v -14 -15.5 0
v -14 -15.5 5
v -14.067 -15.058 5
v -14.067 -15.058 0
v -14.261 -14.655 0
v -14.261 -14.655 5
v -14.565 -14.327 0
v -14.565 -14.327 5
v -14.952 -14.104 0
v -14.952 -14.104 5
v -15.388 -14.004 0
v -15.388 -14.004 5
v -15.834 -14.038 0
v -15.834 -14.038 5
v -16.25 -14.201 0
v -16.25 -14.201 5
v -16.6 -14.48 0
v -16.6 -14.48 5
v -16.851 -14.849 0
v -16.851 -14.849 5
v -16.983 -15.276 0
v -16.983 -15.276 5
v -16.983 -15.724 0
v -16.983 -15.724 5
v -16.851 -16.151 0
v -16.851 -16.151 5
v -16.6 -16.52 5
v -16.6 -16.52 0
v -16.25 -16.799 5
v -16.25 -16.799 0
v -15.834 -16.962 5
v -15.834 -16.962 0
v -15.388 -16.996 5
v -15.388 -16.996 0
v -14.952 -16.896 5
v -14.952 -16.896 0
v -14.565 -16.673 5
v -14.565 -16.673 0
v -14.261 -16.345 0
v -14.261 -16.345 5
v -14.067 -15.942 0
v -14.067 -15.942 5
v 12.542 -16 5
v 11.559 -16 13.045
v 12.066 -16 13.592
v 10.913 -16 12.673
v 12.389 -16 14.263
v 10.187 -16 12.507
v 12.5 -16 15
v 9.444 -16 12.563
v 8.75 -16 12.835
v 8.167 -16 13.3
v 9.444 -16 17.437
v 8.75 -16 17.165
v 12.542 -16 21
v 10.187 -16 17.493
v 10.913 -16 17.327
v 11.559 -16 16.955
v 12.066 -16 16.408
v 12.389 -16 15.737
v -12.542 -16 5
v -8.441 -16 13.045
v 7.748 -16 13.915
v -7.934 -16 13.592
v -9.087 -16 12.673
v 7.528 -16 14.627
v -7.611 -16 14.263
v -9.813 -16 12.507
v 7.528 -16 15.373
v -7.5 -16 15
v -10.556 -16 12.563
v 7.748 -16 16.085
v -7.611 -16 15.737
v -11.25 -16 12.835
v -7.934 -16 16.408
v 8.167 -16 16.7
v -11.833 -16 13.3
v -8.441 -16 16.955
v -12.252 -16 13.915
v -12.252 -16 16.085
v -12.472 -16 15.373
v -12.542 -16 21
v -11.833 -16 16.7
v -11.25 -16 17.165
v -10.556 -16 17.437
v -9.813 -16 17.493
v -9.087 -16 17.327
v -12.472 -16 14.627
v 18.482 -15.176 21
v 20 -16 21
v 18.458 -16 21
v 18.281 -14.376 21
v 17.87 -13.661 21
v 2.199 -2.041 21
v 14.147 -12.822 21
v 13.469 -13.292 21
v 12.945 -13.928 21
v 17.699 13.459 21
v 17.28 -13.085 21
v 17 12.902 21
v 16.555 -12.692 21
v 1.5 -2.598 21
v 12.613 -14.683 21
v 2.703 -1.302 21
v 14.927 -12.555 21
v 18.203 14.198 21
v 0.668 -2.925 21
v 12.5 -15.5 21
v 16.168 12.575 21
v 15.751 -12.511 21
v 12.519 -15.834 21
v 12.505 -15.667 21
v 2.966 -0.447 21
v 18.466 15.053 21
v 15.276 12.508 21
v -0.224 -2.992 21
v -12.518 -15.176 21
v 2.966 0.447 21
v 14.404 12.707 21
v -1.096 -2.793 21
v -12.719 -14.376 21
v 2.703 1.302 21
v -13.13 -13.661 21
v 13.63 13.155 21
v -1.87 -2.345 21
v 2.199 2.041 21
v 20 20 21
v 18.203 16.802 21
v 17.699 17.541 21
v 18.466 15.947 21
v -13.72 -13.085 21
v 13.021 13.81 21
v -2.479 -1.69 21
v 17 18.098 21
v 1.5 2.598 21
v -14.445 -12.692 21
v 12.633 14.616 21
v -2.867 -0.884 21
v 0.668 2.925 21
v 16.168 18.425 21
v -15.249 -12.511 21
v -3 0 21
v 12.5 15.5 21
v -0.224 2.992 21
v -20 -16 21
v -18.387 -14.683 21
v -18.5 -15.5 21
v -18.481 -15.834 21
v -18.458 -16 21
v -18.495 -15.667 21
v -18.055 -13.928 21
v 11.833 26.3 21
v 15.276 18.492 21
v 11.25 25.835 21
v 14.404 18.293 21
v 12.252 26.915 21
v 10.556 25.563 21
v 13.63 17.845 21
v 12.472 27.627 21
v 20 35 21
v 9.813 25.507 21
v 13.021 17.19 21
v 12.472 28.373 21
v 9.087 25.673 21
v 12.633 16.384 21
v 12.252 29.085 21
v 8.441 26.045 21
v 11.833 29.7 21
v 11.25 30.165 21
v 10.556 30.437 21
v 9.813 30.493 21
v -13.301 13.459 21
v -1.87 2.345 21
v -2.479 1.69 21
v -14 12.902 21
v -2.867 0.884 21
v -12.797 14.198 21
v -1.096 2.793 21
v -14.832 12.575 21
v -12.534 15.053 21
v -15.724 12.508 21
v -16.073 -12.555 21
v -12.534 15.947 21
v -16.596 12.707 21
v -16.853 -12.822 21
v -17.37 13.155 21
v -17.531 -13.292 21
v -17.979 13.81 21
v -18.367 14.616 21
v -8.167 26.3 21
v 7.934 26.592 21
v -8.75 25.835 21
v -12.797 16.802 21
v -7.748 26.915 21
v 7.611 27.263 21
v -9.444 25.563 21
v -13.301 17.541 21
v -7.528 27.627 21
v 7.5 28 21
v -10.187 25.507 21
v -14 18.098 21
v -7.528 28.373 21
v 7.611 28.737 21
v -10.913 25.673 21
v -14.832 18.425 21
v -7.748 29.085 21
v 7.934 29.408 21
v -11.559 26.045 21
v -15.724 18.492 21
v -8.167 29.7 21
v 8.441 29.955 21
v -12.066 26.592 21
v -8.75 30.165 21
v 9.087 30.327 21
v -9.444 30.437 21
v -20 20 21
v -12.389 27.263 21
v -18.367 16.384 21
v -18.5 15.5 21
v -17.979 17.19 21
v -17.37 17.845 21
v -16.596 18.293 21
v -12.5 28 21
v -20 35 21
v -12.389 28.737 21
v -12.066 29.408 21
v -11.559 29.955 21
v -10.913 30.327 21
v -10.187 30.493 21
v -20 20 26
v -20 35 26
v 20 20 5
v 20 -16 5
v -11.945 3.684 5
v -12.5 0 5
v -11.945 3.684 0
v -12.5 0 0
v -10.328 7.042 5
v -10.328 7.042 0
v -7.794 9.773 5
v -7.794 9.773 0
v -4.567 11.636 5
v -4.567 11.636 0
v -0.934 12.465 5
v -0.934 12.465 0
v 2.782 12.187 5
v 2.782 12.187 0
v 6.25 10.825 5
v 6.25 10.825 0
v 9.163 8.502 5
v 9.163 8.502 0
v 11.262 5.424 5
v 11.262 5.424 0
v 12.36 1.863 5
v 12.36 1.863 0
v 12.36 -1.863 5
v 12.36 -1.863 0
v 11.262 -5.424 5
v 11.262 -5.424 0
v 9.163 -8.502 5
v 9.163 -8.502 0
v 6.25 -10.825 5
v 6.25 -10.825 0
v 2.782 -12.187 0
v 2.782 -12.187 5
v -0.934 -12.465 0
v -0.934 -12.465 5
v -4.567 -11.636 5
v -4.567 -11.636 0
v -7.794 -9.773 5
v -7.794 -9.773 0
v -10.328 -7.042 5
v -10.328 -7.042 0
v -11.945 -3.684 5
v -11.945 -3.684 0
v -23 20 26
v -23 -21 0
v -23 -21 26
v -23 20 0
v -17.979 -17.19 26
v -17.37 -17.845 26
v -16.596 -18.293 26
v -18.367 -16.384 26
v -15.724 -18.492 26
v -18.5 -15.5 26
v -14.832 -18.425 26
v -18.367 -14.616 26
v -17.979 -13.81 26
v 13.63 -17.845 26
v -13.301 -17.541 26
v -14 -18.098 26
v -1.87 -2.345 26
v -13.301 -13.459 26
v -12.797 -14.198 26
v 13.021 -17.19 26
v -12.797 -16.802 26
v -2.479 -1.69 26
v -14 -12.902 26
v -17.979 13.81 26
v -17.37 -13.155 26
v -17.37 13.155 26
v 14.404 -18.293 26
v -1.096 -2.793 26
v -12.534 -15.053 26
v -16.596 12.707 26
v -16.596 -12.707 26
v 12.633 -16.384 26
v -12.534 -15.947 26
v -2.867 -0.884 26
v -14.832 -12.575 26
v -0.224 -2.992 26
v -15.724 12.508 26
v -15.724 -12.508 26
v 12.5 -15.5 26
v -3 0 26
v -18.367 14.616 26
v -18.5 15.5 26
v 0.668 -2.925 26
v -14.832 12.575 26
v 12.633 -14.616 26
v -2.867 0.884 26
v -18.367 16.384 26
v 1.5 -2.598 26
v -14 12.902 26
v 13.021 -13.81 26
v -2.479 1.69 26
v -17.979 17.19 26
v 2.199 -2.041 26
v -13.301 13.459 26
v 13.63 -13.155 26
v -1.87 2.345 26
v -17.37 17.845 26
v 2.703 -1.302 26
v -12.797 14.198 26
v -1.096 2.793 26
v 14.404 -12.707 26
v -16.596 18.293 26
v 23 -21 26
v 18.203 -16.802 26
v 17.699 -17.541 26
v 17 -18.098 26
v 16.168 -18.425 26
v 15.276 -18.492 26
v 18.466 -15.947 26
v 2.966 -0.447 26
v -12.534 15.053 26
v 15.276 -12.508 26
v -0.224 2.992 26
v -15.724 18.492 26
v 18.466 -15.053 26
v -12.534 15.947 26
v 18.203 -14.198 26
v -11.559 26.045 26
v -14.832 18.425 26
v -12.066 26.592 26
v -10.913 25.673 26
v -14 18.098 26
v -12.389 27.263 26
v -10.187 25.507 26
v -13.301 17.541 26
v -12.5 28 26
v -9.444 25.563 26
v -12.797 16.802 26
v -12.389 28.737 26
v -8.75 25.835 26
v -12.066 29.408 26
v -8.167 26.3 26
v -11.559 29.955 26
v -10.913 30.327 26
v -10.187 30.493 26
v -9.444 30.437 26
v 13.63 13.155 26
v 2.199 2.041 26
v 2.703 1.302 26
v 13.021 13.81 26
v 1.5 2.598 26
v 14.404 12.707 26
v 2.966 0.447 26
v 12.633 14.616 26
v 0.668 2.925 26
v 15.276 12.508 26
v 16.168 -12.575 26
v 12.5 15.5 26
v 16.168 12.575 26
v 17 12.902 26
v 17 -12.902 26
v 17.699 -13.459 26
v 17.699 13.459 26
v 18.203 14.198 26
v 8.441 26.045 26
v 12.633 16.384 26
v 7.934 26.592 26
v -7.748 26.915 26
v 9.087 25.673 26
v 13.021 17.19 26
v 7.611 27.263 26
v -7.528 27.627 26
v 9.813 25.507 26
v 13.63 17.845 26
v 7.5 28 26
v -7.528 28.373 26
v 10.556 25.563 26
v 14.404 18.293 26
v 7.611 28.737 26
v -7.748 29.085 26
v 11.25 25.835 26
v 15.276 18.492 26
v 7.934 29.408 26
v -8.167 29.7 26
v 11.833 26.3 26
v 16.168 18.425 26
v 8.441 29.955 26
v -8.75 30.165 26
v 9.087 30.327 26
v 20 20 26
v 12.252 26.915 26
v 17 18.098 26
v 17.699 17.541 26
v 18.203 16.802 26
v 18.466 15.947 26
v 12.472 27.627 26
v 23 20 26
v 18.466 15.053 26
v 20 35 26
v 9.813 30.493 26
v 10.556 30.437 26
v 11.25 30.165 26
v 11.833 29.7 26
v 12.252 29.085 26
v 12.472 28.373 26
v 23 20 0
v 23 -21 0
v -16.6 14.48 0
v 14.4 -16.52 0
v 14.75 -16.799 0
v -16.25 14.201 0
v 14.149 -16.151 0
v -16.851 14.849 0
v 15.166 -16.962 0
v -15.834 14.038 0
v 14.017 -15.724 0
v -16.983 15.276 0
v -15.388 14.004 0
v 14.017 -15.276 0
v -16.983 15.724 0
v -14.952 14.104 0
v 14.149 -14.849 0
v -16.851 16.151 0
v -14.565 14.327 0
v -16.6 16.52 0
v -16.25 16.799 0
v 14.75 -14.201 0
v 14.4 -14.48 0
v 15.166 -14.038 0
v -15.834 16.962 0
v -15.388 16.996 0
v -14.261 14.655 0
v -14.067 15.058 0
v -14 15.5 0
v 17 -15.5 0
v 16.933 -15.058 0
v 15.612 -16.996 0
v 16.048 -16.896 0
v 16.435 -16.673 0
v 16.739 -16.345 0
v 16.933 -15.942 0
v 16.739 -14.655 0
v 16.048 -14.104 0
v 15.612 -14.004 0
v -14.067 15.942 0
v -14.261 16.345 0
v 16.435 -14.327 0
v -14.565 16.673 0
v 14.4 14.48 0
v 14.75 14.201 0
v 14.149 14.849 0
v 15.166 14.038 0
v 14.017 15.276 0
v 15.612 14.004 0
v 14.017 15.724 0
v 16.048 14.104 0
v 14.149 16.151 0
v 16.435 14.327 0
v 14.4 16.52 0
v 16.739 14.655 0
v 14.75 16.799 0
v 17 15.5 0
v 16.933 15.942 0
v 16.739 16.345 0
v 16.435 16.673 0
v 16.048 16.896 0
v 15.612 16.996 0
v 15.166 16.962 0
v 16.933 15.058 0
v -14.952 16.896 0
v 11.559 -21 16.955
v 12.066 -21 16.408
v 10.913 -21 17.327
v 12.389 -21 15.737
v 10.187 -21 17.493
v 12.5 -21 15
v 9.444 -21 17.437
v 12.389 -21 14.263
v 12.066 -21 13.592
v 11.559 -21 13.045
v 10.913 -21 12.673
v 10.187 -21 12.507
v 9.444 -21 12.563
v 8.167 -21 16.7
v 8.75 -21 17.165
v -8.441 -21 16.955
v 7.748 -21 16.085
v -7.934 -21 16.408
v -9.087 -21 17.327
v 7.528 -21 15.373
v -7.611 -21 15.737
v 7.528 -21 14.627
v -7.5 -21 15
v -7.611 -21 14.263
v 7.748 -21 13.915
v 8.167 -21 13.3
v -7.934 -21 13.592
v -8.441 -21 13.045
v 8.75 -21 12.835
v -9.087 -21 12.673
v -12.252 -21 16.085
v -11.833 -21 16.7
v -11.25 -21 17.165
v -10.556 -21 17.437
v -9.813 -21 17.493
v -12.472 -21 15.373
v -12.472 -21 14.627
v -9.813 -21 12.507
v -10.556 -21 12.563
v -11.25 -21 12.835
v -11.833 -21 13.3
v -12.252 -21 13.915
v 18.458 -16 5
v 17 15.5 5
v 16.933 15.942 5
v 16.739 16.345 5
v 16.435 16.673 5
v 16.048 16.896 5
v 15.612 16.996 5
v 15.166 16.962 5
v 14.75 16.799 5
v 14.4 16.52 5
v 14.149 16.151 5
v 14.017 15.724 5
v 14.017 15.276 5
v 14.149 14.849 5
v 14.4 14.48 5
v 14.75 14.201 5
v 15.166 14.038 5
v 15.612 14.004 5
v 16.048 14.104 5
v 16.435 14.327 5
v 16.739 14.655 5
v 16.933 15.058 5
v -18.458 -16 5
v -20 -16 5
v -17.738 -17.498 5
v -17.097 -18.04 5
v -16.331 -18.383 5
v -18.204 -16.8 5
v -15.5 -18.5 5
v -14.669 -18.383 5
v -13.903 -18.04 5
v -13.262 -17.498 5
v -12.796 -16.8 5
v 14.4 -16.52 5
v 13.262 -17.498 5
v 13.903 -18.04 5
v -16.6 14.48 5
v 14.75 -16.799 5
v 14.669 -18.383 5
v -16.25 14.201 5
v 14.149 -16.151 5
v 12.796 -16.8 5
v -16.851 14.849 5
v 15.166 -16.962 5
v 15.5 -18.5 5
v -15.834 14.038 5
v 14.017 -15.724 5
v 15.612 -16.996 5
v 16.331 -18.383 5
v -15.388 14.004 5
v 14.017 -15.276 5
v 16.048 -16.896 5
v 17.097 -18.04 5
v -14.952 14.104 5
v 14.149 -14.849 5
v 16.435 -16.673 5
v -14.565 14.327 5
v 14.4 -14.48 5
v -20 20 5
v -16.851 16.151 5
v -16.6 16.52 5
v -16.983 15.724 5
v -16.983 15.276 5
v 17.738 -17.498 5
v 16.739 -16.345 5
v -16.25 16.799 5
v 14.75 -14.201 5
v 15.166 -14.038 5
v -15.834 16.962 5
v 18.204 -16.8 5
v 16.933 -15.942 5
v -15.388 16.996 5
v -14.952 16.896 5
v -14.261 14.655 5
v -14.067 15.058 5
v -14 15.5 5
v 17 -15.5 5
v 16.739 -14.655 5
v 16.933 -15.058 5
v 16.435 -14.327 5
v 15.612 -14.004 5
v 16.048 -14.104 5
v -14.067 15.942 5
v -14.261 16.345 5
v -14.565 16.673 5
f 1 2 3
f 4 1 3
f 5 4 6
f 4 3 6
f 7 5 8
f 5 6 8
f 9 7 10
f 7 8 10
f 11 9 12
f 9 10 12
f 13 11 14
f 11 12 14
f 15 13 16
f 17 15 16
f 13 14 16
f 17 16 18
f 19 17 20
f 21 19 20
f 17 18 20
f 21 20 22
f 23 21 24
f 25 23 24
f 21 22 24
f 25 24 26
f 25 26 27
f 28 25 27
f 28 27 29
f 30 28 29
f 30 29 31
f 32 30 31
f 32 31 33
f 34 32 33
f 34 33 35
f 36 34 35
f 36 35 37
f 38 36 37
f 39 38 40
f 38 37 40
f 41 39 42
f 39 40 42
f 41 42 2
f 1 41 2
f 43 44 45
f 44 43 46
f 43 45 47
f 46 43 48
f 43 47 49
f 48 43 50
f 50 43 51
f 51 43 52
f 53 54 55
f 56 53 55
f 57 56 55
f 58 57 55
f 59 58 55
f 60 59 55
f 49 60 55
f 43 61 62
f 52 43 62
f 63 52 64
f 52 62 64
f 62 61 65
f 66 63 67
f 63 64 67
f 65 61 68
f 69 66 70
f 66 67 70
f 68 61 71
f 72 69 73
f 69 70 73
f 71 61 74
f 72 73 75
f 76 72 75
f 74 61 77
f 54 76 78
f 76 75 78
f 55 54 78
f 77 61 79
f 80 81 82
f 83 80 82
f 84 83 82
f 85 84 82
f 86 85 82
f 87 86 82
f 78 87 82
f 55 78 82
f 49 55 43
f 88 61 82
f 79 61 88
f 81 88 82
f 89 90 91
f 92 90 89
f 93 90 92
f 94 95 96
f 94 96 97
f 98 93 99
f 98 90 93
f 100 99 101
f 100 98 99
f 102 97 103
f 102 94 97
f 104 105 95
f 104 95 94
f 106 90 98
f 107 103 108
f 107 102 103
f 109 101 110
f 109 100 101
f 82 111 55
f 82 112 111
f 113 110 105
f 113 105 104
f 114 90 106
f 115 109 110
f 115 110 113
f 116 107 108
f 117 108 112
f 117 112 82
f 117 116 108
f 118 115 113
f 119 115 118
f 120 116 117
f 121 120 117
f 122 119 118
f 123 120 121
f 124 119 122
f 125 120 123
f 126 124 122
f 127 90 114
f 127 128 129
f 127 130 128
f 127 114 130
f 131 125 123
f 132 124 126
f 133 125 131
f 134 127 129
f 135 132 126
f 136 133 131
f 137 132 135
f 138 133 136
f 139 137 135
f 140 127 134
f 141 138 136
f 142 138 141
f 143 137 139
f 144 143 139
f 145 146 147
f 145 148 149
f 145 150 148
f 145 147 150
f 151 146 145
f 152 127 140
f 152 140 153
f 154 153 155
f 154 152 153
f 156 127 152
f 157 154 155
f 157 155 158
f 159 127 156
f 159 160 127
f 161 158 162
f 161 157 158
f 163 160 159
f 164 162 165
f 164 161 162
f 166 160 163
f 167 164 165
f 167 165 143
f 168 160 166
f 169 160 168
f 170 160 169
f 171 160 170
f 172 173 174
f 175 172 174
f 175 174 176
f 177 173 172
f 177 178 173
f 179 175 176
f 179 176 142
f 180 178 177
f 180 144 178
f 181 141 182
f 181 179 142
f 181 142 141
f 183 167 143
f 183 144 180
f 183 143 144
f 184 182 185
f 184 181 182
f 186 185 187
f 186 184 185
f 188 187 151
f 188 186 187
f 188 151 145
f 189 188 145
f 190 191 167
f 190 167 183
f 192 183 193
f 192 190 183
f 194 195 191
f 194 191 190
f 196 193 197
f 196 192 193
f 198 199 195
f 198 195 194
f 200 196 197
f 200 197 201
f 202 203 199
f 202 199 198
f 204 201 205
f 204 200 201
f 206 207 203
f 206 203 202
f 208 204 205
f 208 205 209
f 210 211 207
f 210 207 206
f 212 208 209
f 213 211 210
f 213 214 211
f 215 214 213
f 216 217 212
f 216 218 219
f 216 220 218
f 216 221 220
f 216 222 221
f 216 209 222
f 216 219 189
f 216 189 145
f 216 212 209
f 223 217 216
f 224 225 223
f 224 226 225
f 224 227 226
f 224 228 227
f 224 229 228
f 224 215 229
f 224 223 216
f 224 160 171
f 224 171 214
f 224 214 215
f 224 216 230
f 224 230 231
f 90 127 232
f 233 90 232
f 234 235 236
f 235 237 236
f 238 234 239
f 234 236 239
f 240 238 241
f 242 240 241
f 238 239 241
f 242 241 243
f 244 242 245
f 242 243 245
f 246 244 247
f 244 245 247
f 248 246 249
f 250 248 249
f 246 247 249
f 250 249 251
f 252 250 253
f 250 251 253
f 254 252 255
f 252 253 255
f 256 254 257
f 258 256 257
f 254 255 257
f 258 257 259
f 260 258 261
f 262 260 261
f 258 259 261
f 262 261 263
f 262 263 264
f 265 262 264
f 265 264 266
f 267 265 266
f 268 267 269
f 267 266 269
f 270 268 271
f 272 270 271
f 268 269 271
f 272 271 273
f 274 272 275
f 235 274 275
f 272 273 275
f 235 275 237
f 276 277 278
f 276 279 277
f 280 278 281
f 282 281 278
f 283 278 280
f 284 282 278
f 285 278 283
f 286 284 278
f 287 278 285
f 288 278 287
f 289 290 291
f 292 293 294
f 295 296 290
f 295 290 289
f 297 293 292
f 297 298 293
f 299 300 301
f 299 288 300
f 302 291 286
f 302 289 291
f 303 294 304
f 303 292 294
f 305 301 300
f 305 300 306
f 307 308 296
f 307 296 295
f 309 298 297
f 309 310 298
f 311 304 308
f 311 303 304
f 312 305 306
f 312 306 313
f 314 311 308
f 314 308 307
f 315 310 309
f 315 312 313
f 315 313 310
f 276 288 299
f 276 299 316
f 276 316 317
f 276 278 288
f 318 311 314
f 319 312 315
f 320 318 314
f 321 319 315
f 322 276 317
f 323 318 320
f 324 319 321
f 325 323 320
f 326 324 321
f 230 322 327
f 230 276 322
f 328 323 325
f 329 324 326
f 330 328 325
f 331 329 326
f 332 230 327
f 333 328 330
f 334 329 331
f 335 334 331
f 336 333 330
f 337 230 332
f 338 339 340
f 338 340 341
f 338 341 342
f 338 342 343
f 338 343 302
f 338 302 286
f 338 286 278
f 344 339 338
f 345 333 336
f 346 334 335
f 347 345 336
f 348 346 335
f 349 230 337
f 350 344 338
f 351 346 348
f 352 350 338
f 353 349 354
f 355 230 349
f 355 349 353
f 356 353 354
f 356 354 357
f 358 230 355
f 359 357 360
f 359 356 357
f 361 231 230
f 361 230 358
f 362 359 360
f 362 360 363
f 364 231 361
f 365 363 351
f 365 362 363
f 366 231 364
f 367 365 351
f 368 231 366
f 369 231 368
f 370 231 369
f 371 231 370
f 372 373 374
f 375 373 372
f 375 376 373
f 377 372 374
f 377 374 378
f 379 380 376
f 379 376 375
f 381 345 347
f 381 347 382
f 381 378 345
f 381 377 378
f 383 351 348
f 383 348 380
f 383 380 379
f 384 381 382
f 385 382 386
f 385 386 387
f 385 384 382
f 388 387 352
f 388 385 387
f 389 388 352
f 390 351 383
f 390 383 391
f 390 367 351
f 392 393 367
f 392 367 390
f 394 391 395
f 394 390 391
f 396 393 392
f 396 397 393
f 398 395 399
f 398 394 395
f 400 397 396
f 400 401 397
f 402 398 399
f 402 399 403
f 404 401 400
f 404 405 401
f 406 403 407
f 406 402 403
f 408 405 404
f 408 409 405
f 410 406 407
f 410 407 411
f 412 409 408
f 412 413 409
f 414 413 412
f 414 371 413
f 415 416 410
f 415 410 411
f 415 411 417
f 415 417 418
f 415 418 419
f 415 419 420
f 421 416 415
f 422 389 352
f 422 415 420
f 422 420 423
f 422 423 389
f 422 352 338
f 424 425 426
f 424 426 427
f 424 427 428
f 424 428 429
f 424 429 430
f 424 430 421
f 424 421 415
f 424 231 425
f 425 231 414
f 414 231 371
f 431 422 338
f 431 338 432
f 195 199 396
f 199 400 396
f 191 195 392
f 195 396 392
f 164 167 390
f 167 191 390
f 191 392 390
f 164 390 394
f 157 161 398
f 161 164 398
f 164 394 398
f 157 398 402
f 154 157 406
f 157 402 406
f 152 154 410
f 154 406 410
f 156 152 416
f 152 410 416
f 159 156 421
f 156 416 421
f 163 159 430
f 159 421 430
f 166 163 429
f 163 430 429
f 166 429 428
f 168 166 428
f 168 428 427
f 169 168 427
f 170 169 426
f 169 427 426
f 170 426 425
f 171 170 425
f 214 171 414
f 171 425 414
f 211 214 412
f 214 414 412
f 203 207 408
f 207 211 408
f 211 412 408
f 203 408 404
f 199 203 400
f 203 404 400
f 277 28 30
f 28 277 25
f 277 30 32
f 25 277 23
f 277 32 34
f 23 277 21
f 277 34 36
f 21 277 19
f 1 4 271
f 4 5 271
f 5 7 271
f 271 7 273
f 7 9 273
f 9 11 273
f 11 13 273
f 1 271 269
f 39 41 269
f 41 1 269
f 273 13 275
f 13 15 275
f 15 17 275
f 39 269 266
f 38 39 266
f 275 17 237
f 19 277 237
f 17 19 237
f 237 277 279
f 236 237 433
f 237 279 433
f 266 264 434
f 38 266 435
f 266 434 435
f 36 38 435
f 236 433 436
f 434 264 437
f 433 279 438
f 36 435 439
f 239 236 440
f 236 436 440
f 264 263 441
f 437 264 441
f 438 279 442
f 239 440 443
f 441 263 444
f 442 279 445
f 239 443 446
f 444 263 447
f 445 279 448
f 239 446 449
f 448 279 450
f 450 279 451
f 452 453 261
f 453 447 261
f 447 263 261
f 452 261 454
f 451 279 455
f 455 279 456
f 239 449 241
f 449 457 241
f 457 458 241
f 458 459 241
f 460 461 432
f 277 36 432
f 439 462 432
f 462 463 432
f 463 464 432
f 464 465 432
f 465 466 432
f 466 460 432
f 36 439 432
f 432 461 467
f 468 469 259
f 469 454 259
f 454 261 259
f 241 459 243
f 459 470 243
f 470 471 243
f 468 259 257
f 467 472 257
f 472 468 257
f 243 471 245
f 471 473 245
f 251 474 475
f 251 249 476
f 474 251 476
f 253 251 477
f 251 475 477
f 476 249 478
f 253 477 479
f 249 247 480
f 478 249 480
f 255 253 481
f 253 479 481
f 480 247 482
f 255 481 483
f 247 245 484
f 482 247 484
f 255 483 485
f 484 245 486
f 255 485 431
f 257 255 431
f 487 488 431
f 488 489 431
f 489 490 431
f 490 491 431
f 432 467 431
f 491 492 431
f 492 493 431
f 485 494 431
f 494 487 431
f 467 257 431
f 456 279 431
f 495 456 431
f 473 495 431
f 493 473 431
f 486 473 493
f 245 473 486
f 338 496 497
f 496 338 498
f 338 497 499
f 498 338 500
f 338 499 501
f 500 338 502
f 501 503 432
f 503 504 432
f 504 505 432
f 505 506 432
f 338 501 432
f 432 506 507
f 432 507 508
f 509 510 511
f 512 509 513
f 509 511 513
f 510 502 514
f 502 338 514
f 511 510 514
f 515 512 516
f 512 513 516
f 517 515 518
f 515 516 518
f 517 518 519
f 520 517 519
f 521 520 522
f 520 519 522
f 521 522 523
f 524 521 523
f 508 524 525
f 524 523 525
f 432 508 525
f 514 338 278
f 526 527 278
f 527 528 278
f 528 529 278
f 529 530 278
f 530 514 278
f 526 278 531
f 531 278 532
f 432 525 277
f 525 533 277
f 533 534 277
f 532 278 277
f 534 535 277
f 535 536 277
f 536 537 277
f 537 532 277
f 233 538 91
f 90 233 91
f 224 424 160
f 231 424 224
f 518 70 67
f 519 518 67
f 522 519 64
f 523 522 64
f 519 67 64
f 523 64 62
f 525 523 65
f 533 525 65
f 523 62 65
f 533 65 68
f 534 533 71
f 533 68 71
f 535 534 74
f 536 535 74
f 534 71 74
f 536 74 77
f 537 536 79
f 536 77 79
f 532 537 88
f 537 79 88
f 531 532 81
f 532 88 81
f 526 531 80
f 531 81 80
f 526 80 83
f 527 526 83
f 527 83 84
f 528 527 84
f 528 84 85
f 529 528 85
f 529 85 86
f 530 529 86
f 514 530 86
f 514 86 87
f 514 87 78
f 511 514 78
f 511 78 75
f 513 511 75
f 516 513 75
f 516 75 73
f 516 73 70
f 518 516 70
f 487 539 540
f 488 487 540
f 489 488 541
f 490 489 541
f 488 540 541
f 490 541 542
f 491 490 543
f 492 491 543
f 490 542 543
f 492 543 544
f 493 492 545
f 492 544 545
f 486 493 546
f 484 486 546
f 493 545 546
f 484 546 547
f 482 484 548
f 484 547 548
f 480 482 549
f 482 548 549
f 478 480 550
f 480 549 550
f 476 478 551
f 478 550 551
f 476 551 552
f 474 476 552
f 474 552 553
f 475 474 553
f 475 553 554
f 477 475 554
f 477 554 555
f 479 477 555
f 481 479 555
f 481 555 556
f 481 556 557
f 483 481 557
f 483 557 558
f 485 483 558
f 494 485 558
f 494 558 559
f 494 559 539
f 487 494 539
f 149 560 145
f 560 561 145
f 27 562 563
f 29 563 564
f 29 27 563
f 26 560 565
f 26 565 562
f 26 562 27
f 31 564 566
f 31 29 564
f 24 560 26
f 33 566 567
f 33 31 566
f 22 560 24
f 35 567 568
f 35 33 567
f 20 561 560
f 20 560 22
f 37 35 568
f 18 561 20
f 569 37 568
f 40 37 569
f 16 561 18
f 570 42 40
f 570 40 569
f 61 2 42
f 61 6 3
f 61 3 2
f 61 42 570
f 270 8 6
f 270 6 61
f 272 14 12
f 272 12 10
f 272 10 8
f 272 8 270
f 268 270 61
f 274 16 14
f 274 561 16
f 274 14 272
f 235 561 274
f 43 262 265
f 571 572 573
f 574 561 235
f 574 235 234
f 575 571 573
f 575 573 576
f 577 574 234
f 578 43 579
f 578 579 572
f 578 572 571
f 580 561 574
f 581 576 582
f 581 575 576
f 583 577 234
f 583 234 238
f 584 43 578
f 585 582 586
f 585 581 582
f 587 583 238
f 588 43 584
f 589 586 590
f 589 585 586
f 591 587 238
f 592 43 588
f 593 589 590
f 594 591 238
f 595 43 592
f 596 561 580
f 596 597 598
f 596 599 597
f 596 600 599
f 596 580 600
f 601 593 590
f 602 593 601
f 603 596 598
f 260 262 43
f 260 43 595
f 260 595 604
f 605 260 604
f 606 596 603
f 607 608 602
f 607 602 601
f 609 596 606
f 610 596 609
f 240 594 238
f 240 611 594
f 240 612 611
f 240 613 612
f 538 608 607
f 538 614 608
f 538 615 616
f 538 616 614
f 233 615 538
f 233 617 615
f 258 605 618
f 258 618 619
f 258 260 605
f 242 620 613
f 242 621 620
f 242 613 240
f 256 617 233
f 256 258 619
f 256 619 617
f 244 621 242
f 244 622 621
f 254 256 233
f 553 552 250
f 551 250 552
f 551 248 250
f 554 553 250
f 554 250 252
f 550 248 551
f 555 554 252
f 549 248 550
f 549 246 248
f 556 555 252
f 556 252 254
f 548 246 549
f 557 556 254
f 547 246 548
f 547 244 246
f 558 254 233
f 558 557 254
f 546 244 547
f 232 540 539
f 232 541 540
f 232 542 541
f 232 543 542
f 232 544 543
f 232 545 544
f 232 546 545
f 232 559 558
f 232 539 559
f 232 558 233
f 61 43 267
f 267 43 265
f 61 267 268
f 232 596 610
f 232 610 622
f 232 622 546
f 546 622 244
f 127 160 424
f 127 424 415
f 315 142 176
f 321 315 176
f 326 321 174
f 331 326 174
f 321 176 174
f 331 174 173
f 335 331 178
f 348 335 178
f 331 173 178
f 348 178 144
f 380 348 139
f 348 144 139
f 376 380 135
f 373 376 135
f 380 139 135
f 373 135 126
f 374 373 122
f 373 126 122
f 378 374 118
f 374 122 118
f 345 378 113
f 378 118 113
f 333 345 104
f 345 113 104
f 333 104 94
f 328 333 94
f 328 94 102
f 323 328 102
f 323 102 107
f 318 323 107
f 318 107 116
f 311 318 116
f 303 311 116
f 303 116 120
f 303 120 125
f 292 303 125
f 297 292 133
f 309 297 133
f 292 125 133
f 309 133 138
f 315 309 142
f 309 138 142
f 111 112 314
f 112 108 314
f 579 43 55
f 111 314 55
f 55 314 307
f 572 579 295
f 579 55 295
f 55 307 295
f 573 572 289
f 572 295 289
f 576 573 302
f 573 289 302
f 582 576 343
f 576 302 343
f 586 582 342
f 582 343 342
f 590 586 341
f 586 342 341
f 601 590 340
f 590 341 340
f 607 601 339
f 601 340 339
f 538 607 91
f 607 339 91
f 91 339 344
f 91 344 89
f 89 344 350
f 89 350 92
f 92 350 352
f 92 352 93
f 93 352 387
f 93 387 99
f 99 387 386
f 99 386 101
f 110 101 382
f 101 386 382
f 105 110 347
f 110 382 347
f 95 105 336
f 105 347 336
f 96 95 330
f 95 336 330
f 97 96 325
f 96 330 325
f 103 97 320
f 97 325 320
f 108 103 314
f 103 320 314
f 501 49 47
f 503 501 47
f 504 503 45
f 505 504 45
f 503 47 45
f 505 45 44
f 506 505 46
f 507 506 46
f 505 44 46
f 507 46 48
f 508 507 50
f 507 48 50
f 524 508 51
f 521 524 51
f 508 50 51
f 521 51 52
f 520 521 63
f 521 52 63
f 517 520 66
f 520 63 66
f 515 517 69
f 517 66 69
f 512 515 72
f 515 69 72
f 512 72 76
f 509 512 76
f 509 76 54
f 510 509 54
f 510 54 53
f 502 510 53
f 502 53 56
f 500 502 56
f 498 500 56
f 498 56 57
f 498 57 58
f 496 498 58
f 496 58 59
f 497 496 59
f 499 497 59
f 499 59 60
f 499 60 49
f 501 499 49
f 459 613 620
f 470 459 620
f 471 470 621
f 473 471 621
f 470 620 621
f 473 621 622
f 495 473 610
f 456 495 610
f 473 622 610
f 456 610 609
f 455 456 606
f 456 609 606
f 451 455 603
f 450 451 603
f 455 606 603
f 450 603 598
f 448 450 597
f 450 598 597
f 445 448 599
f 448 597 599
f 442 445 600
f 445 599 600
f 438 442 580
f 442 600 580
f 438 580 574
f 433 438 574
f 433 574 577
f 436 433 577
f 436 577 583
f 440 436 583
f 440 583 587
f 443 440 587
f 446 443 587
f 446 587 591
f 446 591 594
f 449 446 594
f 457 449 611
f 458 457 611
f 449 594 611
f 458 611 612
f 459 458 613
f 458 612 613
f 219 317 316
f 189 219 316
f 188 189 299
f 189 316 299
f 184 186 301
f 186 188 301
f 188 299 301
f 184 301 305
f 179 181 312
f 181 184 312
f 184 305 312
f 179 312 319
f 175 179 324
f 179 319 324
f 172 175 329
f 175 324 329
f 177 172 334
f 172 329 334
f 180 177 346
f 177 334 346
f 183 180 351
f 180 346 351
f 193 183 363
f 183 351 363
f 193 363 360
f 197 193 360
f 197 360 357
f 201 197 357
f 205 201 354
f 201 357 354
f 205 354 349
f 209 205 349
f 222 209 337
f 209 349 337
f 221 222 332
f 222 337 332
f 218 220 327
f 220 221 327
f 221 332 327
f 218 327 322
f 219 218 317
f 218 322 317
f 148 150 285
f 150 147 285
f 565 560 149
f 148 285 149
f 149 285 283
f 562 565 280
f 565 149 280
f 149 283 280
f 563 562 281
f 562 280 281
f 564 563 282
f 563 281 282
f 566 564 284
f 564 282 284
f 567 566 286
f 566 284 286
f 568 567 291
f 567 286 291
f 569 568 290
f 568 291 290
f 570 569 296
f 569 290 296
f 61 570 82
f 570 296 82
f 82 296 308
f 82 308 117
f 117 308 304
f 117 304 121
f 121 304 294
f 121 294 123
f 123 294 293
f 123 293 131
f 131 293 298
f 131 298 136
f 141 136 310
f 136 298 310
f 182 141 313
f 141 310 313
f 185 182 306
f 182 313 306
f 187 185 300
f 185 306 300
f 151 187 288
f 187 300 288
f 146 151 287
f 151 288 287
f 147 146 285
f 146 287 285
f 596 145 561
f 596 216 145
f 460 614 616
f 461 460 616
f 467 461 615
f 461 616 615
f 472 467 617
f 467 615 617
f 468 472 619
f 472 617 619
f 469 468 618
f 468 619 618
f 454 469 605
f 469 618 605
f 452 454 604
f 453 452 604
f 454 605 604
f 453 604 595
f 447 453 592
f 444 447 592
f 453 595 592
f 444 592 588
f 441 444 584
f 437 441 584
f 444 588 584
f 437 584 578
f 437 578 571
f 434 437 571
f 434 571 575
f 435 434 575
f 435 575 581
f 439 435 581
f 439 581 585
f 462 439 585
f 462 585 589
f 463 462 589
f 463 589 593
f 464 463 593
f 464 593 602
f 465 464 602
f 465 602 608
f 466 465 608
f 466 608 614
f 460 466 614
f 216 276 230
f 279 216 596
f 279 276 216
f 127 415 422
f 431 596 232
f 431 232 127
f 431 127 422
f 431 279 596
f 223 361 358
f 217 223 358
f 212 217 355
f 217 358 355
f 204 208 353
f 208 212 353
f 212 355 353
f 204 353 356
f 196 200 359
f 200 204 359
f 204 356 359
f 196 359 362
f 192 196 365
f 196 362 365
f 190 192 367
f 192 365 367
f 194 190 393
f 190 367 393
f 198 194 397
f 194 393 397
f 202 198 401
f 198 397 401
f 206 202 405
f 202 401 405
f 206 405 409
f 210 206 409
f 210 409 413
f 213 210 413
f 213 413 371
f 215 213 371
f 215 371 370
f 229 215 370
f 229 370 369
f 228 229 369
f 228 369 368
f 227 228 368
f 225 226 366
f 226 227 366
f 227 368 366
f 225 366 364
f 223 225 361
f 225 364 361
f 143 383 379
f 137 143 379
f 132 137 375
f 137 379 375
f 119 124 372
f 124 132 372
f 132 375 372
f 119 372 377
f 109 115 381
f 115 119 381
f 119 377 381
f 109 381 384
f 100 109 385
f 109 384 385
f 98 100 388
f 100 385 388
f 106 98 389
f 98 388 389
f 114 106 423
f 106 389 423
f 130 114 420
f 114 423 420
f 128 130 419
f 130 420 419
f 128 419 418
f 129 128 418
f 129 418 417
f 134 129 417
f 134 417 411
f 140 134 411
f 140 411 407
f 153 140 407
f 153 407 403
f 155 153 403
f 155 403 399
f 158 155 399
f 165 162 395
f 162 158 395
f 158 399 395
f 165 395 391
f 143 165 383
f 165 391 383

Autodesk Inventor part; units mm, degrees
ref_plane "YZ Plane" through (0, 0, 0) normal (1, 0, 0) x (0, 1, 0)
ref_plane "XZ Plane" through (0, 0, 0) normal (0, 1, 0) x (-1, 0, 0)
sketch "Boceto1" plane through (0, 0, 0) normal (0, 0, 1) x (1, 0, 0)
  line L0 (-20, 20) -> (20, 20)
  line L1 (20, 20) -> (20, -20)
  line L2 (20, -20) -> (-20, -20)
  line L3 (-20, -20) -> (-20, 20)
  line L4 (6.44, 0) -> (0, 0)
  line L5 (0, 0) -> (0, 3.5859)
  dimension "d0" = 40
  dimension "d1" = 40
extrude "Extrusión1" add sketch "Boceto1" along normal blind 5
sketch "Boceto2" plane through (0, 0, 5) normal (0, 0, 1) x (1, 0, 0)
  circle A0 centre (15.5, 15.5) radius 1.5
  point P0 (0, 0)
  dimension "d4" = 3
  dimension "d5" = 15.5
  dimension "d6" = 15.5
extrude "Extrusión2" cut sketch "Boceto2" against normal through all
pattern_linear "Patrón rectangular1" count 2 spacing 31 along (-1, 0, 0) count 2 spacing 31 along (0, -1, 0) of "Extrusión2"
ref_plane "Plano de trabajo1" through (0, 0, 26) normal (0, 0, -1) x (-1, 0, 0)
sketch "Boceto6" plane through (0, 0, 26) normal (0, 0, -1) x (-1, 0, 0)
  circle A0 centre (15.5, -15.5) radius 1.5 projected
  circle A1 centre (-15.5, -15.5) radius 1.5 projected
  circle A2 centre (15.5, 15.5) radius 1.5 projected
  circle A3 centre (-15.5, 15.5) radius 1.5 projected
  line L0 (20, -20) -> (-20, -20) projected
  line L1 (-20, -20) -> (-20, 20) projected
  line L2 (-20, 20) -> (20, 20) projected
  line L3 (20, 20) -> (20, -20) projected
  line L4 (20, 20) -> (-20, 20)
  line L5 (-20, 20) -> (-20, 35)
  line L6 (-20, 35) -> (20, 35)
  line L7 (20, 35) -> (20, 20)
  circle A4 centre (-10, 28) radius 2.5
  circle A5 centre (10, 28) radius 2.5
  circle A6 centre (-15.5, -15.5) radius 3
  circle A7 centre (-15.5, 15.5) radius 1.5 projected
  circle A8 centre (-15.5, 15.5) radius 3
  circle A9 centre (15.5, 15.5) radius 1.5 projected
  circle A10 centre (15.5, 15.5) radius 3
  circle A11 centre (15.5, -15.5) radius 1.5 projected
  circle A12 centre (15.5, -15.5) radius 3
  dimension "d31" = 15
  dimension "d32" = 5
  dimension "d33" = 5
  dimension "d34" = 10
  dimension "d35" = 10
  dimension "d36" = 7
  dimension "d37" = 7
  dimension "d40" = 6
  dimension "d41" = 6
  dimension "d42" = 6
  dimension "d43" = 6
extrude "Extrusión5" add sketch "Boceto6" along normal blind 5 contours L0 L1 L2 L3 | L2 L5 L6 L7
sketch "Boceto7" plane through (-20, -20, 0) normal (-1, 0, 0) x (0, 0, 1)
  line L0 (26, 0) -> (26, 55) projected
  line L1 (5, 40) -> (5, 0) projected
  line L2 (5, 4) -> (21, 4)
  line L3 (21, 4) -> (21, -1)
  line L4 (21, -1) -> (5, -1)
  line L5 (5, -1) -> (5, 4)
  line L6 (26, 0) -> (21, 0) projected
  line L7 (0, 0) -> (5, 0) projected
  line L8 (5, -1) -> (0, -1)
  line L9 (0, -1) -> (0, 0)
  line L10 (0, 0) -> (5, 0)
  line L11 (5, 0) -> (5, -1)
  line L12 (21, -1) -> (26, -1)
  line L13 (26, -1) -> (26, 0)
  line L14 (26, 0) -> (21, 0)
  line L15 (21, 0) -> (21, -1)
  point P0 (0, 20)
  dimension "d48" = 1
  dimension "d49" = 5
extrude "Extrusión6" add sketch "Boceto7" against normal up to surface (40 mm away)
sketch "Boceto8" plane through (0, 0, 26) normal (0, 0, 1) x (1, 0, 0)
  circle A0 centre (-15.5, -15.5) radius 3 projected
  circle A1 centre (15.5, -15.5) radius 3 projected
  point P0 (0, 0)
extrude "Extrusión7" cut sketch "Boceto8" against normal up to surface (21 mm away)
sketch "Boceto9" plane through (-12.542, -16, 5) normal (0, 1, 0) x (1, 0, 0)
  circle A0 centre (2.542, -10) radius 2.5
  circle A1 centre (22.542, -10) radius 2.5
  line L0 (-7.458, -16) -> (-7.458, 0) projected
  line L1 (32.542, -16) -> (32.542, 0) projected
  line L2 (-7.458, -21) -> (32.542, -21) projected
  point P0 (12.542, 5)
  dimension "d52" = 5
  dimension "d53" = 5
  dimension "d54" = 10
  dimension "d55" = 10
  dimension "d56" = 11
  dimension "d57" = 11
extrude "Extrusión8" cut sketch "Boceto9" against normal through all
sketch "Boceto10" plane through (0, 0, 0) normal (0, 0, -1) x (-1, 0, 0)
  circle A0 centre (0, 0) radius 12.5
  dimension "d60" = 25
extrude "Extrusión9" cut sketch "Boceto10" against normal up to surface (5 mm away)
sketch "Boceto11" plane through (-20, 20, 0) normal (0, 1, 0) x (1, 0, 0)
  line L0 (40, 0) -> (0, 0) projected
  line L1 (0, 0) -> (-3, 0)
  line L2 (-3, 0) -> (-3, -26)
  line L3 (-3, -26) -> (0, -26)
  line L4 (0, -26) -> (0, 0)
  line L5 (40, -26) -> (40, -21) projected
  line L6 (40, -26) -> (43, -26)
  line L7 (43, -26) -> (43, 0)
  line L8 (43, 0) -> (40, 0)
  line L9 (40, 0) -> (40, -26)
  point P0 (20, 0)
  dimension "d63" = 3
  dimension "d64" = 3
extrude "Extrusión10" add sketch "Boceto11" against normal up to surface (41 mm away)
sketch "Boceto12" plane through (0, 0, 0) normal (0, 0, -1) x (-1, 0, 0)
  circle A0 centre (0, 0) radius 3
  dimension "d67" = 6
extrude "Extrusión11" cut sketch "Boceto12" against normal up to surface (26 mm away)
equation "\"d33\" = d32"
equation "\"d35\" = d34"
equation "\"d36\" = d37"
equation "\"d41\" = d40"
equation "\"d42\" = d40"
equation "\"d43\" = d40"
equation "\"d53\" = d52"
equation "\"d57\" = d56"
equation "\"d64\" = d63"
properties part number "Base Motor Z"
